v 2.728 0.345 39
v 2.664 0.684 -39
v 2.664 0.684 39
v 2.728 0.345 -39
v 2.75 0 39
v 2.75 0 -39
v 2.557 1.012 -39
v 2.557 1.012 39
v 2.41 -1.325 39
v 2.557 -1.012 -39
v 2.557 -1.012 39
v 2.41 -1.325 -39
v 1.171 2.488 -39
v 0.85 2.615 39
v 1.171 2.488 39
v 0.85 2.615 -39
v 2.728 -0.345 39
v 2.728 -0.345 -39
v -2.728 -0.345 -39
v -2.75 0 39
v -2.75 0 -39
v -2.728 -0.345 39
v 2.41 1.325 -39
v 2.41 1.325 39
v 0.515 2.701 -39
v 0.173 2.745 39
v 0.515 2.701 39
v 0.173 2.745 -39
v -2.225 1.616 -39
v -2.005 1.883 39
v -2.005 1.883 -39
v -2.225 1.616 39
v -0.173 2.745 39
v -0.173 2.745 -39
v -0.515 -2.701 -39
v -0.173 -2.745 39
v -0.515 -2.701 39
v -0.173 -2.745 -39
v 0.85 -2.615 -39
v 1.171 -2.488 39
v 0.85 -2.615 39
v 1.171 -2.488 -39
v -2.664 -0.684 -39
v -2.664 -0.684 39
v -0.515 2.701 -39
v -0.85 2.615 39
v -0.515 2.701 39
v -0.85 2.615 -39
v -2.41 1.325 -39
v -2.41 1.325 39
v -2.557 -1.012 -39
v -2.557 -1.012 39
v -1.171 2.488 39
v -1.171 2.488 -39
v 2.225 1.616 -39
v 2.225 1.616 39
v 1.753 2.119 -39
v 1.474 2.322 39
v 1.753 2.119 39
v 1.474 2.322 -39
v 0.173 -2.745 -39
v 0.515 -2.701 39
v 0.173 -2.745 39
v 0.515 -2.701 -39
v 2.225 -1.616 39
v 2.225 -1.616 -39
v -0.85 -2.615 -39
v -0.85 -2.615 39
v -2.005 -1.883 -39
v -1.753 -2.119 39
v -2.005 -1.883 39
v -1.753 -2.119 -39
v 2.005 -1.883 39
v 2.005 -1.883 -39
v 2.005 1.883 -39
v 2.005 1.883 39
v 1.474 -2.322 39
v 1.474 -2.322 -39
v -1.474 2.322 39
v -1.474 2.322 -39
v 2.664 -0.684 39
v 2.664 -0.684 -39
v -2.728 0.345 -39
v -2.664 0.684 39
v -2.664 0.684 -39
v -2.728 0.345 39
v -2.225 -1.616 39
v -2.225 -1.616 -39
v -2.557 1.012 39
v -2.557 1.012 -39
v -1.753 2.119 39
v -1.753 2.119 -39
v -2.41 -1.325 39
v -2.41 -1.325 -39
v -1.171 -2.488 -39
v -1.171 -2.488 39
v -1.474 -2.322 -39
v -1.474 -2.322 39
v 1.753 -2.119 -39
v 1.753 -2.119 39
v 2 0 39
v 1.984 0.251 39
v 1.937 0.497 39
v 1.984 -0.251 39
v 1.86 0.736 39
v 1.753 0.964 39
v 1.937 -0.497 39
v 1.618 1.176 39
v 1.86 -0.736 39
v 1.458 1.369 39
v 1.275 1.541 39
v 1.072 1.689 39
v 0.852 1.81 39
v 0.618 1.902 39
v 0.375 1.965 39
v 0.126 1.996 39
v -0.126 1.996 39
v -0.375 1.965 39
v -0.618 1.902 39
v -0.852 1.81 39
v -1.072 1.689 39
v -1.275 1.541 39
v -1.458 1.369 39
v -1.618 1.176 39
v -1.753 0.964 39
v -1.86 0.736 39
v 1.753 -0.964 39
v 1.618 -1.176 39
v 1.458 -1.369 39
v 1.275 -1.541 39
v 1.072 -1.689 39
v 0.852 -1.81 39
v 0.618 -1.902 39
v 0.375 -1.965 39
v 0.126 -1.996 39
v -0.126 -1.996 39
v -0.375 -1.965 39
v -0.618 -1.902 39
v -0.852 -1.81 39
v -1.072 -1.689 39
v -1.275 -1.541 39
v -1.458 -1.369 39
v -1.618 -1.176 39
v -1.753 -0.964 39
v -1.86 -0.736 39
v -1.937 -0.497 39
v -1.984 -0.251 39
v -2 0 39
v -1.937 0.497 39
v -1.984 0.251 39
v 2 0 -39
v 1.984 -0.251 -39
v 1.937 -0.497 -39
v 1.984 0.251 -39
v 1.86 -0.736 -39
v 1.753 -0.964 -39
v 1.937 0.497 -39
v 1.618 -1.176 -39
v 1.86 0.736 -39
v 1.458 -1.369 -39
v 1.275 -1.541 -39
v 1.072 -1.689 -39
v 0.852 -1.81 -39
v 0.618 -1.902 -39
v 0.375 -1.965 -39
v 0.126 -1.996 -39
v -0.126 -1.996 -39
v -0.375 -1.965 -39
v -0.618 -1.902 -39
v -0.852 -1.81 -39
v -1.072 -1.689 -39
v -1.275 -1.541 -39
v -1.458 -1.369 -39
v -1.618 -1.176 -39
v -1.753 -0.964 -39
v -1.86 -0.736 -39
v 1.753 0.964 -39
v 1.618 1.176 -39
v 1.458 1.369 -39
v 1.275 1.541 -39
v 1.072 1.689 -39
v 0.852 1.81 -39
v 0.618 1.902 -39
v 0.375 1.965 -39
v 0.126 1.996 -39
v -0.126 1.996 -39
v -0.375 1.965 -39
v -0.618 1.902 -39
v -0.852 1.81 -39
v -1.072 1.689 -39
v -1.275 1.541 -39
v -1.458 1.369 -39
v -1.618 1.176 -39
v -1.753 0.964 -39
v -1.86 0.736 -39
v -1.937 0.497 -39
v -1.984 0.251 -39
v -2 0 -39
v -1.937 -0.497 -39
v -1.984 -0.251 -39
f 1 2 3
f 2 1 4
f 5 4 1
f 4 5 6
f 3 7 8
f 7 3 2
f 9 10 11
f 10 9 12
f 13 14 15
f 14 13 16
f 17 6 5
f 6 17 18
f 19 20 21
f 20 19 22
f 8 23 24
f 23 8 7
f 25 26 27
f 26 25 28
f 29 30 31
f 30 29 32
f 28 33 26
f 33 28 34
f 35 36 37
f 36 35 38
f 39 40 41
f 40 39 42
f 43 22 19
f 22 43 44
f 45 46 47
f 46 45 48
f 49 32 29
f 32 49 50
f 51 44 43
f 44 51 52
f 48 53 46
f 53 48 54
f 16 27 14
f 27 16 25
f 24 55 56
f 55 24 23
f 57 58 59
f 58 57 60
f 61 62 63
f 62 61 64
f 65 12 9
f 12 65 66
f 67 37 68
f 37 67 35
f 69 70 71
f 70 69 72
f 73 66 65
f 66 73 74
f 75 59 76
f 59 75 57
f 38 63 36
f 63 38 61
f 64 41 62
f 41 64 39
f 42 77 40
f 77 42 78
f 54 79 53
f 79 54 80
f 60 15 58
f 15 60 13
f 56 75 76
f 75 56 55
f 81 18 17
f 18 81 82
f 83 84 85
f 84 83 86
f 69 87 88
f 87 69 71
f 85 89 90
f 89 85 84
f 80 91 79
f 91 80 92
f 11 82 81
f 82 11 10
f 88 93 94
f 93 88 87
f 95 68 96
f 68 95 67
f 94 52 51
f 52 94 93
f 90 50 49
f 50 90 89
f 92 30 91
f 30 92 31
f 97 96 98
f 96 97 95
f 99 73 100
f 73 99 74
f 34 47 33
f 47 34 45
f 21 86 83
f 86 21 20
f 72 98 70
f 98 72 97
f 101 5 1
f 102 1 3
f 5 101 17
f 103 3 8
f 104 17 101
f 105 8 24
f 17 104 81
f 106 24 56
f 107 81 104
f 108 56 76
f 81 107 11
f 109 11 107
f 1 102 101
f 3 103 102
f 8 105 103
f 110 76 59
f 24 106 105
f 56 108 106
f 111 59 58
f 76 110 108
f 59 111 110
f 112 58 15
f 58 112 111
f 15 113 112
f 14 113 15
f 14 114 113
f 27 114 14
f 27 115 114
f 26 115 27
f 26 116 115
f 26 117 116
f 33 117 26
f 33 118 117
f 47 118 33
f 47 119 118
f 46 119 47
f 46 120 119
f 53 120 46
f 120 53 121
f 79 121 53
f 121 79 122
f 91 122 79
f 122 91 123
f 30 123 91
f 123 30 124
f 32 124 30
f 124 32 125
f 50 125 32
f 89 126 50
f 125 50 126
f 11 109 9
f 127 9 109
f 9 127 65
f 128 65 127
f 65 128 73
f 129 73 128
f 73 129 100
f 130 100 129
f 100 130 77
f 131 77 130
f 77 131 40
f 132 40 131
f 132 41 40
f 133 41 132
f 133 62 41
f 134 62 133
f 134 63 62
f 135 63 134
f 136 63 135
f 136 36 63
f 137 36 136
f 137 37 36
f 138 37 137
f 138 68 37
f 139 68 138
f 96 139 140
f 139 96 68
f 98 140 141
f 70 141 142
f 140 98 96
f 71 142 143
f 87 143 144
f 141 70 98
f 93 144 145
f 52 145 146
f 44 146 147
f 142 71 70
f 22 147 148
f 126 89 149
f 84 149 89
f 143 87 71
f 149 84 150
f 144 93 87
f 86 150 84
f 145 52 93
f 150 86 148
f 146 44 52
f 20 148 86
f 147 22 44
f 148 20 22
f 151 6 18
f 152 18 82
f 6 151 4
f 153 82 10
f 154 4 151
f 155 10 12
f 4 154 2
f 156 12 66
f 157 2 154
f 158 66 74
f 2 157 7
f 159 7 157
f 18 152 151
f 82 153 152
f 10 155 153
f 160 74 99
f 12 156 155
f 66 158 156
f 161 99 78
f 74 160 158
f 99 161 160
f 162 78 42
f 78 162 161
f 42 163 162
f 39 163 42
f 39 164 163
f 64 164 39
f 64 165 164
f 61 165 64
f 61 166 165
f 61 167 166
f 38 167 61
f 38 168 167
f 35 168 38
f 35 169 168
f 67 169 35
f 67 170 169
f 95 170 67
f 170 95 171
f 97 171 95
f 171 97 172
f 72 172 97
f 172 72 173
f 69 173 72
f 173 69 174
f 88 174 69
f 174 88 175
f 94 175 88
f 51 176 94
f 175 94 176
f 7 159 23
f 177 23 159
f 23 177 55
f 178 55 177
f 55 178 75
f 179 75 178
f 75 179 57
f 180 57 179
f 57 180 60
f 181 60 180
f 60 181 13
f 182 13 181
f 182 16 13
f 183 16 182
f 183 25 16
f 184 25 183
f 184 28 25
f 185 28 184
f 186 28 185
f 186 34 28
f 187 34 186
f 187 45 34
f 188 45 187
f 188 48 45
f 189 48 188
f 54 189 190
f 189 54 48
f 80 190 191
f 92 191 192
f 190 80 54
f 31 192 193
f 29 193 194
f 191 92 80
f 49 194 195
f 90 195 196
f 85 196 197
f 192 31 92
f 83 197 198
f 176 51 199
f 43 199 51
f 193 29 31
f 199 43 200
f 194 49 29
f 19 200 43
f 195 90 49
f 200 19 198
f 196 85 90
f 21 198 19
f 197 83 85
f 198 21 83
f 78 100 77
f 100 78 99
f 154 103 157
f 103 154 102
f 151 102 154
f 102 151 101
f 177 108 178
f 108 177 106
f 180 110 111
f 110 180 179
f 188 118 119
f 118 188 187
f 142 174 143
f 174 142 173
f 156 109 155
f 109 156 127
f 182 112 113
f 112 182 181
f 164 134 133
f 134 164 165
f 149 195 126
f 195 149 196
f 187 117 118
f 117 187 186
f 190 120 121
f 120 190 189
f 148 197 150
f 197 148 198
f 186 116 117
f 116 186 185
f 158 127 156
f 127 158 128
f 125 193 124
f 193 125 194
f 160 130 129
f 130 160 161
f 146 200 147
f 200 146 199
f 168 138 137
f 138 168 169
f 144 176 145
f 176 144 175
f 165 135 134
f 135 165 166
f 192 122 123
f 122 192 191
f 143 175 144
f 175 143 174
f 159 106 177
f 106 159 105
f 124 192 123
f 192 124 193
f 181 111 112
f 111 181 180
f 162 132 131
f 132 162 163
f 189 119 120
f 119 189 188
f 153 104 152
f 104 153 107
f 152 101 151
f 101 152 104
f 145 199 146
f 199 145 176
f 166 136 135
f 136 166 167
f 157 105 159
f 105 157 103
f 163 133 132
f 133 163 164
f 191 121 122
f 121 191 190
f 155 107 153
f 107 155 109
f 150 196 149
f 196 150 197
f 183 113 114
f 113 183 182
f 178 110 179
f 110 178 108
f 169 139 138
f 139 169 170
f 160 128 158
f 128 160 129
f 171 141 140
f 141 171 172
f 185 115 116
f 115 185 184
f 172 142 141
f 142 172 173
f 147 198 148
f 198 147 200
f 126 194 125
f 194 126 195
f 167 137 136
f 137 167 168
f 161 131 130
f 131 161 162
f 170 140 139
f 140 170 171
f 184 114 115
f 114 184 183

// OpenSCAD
$fn = 50;


difference() {
	union() {
		translate(v = [0, 0, -39.0000000000]) {
			cylinder(h = 78, r = 2.7500000000);
		}
	}
	union() {
		translate(v = [0, 0, -100.0000000000]) {
			cylinder(h = 200, r = 2.0000000000);
		}
	}
}
